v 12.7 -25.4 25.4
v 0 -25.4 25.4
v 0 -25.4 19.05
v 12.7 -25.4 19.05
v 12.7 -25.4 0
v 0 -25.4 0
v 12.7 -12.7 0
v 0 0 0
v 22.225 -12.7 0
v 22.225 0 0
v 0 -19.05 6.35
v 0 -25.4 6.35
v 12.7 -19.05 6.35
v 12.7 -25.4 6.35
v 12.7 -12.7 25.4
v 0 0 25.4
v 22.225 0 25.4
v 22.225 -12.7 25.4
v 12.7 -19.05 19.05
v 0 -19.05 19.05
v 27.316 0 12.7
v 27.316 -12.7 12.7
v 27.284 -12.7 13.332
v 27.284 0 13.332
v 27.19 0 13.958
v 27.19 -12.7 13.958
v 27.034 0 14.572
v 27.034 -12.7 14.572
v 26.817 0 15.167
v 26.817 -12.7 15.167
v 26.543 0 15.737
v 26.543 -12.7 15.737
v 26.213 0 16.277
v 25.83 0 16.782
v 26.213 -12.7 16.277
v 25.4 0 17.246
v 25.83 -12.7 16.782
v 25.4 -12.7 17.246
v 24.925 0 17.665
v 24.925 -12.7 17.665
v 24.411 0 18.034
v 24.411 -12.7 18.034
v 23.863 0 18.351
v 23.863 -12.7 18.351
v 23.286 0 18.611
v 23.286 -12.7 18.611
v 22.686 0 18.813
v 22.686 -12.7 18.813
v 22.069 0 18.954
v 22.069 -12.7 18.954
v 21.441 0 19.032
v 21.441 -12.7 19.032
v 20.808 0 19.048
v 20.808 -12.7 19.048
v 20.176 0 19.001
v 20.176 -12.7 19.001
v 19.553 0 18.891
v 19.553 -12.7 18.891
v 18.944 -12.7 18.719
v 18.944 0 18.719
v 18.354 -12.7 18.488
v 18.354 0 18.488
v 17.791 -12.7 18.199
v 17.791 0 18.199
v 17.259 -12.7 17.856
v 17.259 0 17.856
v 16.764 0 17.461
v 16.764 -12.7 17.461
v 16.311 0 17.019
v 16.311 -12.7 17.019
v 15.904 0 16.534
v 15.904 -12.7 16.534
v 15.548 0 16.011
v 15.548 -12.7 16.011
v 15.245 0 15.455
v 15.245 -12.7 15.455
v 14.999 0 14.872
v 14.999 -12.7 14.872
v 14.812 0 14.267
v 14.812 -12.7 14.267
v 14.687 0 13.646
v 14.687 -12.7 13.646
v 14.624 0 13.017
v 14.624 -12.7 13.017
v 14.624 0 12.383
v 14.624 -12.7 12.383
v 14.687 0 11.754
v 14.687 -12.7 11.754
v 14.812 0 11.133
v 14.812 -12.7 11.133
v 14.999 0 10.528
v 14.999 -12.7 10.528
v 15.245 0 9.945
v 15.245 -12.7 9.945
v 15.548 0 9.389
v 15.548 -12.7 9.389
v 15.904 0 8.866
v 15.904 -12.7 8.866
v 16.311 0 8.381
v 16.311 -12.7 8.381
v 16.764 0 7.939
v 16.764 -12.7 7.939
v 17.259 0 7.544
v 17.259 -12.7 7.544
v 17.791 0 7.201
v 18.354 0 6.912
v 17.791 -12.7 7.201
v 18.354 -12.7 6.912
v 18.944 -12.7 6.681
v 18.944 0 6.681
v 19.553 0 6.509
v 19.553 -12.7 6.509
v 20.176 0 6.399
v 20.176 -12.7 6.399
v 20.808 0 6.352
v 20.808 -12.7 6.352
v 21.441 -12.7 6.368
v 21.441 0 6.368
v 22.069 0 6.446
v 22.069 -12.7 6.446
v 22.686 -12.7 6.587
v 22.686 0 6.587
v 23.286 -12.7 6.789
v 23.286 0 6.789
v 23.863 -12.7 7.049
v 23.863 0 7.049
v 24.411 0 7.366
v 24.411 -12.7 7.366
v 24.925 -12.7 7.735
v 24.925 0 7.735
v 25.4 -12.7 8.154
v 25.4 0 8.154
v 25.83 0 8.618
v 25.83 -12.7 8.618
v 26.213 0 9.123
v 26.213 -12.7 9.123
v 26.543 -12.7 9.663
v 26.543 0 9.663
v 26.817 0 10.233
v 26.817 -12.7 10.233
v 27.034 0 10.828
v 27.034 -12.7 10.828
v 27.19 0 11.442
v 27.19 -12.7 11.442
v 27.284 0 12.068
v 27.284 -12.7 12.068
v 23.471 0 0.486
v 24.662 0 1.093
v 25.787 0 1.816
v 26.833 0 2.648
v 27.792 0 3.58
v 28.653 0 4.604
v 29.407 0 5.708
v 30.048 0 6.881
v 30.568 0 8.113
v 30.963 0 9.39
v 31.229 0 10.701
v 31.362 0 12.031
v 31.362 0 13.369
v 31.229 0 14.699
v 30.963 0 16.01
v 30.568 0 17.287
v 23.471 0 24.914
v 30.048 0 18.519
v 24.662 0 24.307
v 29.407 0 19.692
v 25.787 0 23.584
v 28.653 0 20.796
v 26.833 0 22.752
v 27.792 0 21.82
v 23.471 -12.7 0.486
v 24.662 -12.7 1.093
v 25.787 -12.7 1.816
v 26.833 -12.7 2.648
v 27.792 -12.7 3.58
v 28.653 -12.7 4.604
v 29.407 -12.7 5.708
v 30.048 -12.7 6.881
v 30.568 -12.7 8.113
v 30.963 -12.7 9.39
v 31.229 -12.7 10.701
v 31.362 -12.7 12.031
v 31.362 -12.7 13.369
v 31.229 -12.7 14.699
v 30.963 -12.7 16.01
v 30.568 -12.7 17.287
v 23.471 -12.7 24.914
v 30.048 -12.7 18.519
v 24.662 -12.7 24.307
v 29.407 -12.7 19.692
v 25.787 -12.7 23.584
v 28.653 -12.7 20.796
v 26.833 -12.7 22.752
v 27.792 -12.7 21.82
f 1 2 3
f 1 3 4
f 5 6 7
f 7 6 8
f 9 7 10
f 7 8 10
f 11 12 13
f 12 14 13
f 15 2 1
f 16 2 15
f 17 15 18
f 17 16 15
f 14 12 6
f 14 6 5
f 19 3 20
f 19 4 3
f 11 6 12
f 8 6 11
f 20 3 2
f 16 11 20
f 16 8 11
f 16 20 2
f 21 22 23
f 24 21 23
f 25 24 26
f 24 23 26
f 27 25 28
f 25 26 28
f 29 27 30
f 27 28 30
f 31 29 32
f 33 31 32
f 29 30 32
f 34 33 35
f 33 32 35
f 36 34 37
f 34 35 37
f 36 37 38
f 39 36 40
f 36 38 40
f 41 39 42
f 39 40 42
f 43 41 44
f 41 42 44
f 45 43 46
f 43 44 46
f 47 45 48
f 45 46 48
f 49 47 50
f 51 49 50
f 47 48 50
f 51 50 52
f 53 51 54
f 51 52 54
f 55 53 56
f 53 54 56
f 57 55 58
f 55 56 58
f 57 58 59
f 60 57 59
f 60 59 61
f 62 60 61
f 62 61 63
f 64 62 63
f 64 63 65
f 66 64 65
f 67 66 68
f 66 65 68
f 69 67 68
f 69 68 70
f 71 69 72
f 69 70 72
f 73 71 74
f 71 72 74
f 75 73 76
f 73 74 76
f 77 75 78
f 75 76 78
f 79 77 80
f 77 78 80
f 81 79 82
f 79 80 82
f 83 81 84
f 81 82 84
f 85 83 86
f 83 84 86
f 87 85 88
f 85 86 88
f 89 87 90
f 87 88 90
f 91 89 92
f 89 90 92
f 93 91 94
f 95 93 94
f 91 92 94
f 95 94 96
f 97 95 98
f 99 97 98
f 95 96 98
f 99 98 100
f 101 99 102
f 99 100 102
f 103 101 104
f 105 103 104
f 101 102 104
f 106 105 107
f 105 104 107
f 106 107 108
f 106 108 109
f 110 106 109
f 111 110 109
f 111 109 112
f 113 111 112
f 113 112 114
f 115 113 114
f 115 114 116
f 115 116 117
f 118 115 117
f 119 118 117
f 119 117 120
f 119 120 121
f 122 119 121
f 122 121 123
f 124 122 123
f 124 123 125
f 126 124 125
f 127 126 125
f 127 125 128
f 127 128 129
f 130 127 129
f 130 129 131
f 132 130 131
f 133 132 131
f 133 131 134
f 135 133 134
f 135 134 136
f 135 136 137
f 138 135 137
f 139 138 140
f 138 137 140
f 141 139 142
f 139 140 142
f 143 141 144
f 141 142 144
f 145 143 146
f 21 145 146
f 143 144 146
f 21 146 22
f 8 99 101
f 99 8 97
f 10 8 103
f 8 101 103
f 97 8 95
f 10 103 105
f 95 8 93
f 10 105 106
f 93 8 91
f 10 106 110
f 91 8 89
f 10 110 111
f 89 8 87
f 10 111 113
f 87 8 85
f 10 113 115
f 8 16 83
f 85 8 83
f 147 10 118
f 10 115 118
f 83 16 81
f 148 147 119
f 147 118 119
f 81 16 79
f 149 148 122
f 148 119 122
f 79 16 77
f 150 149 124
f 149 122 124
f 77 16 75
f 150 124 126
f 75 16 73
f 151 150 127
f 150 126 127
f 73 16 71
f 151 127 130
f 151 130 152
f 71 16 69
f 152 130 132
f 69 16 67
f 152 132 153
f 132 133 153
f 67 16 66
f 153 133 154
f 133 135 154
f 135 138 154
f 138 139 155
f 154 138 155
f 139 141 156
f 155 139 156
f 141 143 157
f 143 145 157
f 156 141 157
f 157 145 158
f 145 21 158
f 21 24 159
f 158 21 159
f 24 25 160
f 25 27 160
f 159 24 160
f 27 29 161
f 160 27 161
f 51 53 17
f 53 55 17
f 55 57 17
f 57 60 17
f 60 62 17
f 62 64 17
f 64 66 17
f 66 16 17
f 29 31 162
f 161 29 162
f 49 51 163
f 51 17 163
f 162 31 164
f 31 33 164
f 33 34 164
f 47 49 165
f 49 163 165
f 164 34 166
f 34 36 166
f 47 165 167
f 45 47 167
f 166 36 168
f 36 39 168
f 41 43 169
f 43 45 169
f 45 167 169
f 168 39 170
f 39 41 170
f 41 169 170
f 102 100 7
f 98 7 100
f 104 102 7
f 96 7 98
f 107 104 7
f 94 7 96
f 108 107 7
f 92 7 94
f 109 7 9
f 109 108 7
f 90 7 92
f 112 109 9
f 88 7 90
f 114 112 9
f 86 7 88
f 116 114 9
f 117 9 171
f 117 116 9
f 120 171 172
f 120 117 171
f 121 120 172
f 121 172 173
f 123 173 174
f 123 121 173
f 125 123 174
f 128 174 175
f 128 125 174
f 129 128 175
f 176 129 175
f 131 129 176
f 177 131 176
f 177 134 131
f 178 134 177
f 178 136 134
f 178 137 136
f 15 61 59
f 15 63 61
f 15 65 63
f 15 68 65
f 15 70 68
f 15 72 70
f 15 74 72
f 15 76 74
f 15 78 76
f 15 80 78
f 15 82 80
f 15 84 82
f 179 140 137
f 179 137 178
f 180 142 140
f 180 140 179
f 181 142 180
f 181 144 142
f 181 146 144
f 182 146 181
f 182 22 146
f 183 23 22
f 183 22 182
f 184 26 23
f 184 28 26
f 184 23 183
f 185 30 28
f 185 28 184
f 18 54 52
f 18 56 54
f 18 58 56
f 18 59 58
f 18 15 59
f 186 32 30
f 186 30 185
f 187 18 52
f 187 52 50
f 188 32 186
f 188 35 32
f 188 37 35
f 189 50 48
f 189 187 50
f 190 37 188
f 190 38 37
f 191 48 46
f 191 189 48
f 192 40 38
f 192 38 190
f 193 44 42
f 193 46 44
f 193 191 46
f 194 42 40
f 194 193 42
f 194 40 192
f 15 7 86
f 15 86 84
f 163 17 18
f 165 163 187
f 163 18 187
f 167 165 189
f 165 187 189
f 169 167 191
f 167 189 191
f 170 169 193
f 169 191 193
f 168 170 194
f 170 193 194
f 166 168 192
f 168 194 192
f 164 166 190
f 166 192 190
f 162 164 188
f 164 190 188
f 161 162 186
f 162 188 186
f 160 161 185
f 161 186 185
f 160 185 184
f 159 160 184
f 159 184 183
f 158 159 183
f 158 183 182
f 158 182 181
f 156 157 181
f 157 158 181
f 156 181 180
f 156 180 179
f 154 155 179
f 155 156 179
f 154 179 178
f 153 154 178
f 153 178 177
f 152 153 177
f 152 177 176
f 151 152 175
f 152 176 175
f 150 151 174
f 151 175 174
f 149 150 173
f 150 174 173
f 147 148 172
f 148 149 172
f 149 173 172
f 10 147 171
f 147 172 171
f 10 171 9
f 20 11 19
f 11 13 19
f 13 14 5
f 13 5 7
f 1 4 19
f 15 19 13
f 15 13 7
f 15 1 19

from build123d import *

# Parameters (mm, degrees)
F0_W      = 31.75
F0_H      = 25.4
F1_DEPTH  = 25.4
F2_W      = 6.35
F2_H      = 12.7
F3_DEPTH  = 25.4
F4_DEPTH  = 25.4
F5_W      = 19.05
F5_H      = 12.7
F6_DEPTH  = 25.4
F7_R      = 6.35
F8_DEPTH  = 12.7
F10_DEPTH = 25.4


with BuildPart() as f1:
    # F0 (on Front) → F1 (new body)
    with BuildSketch(Plane.XZ):
        with Locations((15.875, 12.7)):
            Rectangle(F0_W, F0_H)
    extrude(amount=F1_DEPTH)

    # F2 (on face) → F3 (cut)
    with BuildSketch(Plane.YZ.offset(31.75)):
        with Locations((-22.225, 12.7)):
            Rectangle(F2_W, F2_H)
    extrude(amount=-F3_DEPTH, mode=Mode.SUBTRACT)

    # F4 (cut): a face of the model
    f4_faces = [f1.faces().sort_by_distance(p)[0] for p in [
        (6.35, -22.225, 12.7),
    ]]
    extrude(f4_faces, amount=-F4_DEPTH, mode=Mode.SUBTRACT)

    # F5 (on face) → F6 (cut)
    with BuildSketch(Plane.XY.offset(25.4)):
        with Locations((22.225, -19.05)):
            Rectangle(F5_W, F5_H)
    extrude(amount=-F6_DEPTH, mode=Mode.SUBTRACT)

    # F7 (on face) → F8 (cut, through all)
    with BuildSketch(Plane.XZ.offset(12.7)):
        with Locations((20.9659710526, 12.7)):
            Circle(F7_R)
    extrude(amount=-F8_DEPTH, mode=Mode.SUBTRACT)

    # F9 (on face) → F10 (cut)
    with BuildSketch(Plane.XZ.offset(12.7)):
        with BuildLine():
            ThreePointArc((22.225, 25.4), (31.3787710318, 12.7), (22.225, 0))
            Line((22.225, 0), (31.75, 0))
            Line((31.75, 0), (31.75, 25.4))
            Line((31.75, 25.4), (22.225, 25.4))
        make_face()
    extrude(amount=-F10_DEPTH, mode=Mode.SUBTRACT)


solid = f1.part
